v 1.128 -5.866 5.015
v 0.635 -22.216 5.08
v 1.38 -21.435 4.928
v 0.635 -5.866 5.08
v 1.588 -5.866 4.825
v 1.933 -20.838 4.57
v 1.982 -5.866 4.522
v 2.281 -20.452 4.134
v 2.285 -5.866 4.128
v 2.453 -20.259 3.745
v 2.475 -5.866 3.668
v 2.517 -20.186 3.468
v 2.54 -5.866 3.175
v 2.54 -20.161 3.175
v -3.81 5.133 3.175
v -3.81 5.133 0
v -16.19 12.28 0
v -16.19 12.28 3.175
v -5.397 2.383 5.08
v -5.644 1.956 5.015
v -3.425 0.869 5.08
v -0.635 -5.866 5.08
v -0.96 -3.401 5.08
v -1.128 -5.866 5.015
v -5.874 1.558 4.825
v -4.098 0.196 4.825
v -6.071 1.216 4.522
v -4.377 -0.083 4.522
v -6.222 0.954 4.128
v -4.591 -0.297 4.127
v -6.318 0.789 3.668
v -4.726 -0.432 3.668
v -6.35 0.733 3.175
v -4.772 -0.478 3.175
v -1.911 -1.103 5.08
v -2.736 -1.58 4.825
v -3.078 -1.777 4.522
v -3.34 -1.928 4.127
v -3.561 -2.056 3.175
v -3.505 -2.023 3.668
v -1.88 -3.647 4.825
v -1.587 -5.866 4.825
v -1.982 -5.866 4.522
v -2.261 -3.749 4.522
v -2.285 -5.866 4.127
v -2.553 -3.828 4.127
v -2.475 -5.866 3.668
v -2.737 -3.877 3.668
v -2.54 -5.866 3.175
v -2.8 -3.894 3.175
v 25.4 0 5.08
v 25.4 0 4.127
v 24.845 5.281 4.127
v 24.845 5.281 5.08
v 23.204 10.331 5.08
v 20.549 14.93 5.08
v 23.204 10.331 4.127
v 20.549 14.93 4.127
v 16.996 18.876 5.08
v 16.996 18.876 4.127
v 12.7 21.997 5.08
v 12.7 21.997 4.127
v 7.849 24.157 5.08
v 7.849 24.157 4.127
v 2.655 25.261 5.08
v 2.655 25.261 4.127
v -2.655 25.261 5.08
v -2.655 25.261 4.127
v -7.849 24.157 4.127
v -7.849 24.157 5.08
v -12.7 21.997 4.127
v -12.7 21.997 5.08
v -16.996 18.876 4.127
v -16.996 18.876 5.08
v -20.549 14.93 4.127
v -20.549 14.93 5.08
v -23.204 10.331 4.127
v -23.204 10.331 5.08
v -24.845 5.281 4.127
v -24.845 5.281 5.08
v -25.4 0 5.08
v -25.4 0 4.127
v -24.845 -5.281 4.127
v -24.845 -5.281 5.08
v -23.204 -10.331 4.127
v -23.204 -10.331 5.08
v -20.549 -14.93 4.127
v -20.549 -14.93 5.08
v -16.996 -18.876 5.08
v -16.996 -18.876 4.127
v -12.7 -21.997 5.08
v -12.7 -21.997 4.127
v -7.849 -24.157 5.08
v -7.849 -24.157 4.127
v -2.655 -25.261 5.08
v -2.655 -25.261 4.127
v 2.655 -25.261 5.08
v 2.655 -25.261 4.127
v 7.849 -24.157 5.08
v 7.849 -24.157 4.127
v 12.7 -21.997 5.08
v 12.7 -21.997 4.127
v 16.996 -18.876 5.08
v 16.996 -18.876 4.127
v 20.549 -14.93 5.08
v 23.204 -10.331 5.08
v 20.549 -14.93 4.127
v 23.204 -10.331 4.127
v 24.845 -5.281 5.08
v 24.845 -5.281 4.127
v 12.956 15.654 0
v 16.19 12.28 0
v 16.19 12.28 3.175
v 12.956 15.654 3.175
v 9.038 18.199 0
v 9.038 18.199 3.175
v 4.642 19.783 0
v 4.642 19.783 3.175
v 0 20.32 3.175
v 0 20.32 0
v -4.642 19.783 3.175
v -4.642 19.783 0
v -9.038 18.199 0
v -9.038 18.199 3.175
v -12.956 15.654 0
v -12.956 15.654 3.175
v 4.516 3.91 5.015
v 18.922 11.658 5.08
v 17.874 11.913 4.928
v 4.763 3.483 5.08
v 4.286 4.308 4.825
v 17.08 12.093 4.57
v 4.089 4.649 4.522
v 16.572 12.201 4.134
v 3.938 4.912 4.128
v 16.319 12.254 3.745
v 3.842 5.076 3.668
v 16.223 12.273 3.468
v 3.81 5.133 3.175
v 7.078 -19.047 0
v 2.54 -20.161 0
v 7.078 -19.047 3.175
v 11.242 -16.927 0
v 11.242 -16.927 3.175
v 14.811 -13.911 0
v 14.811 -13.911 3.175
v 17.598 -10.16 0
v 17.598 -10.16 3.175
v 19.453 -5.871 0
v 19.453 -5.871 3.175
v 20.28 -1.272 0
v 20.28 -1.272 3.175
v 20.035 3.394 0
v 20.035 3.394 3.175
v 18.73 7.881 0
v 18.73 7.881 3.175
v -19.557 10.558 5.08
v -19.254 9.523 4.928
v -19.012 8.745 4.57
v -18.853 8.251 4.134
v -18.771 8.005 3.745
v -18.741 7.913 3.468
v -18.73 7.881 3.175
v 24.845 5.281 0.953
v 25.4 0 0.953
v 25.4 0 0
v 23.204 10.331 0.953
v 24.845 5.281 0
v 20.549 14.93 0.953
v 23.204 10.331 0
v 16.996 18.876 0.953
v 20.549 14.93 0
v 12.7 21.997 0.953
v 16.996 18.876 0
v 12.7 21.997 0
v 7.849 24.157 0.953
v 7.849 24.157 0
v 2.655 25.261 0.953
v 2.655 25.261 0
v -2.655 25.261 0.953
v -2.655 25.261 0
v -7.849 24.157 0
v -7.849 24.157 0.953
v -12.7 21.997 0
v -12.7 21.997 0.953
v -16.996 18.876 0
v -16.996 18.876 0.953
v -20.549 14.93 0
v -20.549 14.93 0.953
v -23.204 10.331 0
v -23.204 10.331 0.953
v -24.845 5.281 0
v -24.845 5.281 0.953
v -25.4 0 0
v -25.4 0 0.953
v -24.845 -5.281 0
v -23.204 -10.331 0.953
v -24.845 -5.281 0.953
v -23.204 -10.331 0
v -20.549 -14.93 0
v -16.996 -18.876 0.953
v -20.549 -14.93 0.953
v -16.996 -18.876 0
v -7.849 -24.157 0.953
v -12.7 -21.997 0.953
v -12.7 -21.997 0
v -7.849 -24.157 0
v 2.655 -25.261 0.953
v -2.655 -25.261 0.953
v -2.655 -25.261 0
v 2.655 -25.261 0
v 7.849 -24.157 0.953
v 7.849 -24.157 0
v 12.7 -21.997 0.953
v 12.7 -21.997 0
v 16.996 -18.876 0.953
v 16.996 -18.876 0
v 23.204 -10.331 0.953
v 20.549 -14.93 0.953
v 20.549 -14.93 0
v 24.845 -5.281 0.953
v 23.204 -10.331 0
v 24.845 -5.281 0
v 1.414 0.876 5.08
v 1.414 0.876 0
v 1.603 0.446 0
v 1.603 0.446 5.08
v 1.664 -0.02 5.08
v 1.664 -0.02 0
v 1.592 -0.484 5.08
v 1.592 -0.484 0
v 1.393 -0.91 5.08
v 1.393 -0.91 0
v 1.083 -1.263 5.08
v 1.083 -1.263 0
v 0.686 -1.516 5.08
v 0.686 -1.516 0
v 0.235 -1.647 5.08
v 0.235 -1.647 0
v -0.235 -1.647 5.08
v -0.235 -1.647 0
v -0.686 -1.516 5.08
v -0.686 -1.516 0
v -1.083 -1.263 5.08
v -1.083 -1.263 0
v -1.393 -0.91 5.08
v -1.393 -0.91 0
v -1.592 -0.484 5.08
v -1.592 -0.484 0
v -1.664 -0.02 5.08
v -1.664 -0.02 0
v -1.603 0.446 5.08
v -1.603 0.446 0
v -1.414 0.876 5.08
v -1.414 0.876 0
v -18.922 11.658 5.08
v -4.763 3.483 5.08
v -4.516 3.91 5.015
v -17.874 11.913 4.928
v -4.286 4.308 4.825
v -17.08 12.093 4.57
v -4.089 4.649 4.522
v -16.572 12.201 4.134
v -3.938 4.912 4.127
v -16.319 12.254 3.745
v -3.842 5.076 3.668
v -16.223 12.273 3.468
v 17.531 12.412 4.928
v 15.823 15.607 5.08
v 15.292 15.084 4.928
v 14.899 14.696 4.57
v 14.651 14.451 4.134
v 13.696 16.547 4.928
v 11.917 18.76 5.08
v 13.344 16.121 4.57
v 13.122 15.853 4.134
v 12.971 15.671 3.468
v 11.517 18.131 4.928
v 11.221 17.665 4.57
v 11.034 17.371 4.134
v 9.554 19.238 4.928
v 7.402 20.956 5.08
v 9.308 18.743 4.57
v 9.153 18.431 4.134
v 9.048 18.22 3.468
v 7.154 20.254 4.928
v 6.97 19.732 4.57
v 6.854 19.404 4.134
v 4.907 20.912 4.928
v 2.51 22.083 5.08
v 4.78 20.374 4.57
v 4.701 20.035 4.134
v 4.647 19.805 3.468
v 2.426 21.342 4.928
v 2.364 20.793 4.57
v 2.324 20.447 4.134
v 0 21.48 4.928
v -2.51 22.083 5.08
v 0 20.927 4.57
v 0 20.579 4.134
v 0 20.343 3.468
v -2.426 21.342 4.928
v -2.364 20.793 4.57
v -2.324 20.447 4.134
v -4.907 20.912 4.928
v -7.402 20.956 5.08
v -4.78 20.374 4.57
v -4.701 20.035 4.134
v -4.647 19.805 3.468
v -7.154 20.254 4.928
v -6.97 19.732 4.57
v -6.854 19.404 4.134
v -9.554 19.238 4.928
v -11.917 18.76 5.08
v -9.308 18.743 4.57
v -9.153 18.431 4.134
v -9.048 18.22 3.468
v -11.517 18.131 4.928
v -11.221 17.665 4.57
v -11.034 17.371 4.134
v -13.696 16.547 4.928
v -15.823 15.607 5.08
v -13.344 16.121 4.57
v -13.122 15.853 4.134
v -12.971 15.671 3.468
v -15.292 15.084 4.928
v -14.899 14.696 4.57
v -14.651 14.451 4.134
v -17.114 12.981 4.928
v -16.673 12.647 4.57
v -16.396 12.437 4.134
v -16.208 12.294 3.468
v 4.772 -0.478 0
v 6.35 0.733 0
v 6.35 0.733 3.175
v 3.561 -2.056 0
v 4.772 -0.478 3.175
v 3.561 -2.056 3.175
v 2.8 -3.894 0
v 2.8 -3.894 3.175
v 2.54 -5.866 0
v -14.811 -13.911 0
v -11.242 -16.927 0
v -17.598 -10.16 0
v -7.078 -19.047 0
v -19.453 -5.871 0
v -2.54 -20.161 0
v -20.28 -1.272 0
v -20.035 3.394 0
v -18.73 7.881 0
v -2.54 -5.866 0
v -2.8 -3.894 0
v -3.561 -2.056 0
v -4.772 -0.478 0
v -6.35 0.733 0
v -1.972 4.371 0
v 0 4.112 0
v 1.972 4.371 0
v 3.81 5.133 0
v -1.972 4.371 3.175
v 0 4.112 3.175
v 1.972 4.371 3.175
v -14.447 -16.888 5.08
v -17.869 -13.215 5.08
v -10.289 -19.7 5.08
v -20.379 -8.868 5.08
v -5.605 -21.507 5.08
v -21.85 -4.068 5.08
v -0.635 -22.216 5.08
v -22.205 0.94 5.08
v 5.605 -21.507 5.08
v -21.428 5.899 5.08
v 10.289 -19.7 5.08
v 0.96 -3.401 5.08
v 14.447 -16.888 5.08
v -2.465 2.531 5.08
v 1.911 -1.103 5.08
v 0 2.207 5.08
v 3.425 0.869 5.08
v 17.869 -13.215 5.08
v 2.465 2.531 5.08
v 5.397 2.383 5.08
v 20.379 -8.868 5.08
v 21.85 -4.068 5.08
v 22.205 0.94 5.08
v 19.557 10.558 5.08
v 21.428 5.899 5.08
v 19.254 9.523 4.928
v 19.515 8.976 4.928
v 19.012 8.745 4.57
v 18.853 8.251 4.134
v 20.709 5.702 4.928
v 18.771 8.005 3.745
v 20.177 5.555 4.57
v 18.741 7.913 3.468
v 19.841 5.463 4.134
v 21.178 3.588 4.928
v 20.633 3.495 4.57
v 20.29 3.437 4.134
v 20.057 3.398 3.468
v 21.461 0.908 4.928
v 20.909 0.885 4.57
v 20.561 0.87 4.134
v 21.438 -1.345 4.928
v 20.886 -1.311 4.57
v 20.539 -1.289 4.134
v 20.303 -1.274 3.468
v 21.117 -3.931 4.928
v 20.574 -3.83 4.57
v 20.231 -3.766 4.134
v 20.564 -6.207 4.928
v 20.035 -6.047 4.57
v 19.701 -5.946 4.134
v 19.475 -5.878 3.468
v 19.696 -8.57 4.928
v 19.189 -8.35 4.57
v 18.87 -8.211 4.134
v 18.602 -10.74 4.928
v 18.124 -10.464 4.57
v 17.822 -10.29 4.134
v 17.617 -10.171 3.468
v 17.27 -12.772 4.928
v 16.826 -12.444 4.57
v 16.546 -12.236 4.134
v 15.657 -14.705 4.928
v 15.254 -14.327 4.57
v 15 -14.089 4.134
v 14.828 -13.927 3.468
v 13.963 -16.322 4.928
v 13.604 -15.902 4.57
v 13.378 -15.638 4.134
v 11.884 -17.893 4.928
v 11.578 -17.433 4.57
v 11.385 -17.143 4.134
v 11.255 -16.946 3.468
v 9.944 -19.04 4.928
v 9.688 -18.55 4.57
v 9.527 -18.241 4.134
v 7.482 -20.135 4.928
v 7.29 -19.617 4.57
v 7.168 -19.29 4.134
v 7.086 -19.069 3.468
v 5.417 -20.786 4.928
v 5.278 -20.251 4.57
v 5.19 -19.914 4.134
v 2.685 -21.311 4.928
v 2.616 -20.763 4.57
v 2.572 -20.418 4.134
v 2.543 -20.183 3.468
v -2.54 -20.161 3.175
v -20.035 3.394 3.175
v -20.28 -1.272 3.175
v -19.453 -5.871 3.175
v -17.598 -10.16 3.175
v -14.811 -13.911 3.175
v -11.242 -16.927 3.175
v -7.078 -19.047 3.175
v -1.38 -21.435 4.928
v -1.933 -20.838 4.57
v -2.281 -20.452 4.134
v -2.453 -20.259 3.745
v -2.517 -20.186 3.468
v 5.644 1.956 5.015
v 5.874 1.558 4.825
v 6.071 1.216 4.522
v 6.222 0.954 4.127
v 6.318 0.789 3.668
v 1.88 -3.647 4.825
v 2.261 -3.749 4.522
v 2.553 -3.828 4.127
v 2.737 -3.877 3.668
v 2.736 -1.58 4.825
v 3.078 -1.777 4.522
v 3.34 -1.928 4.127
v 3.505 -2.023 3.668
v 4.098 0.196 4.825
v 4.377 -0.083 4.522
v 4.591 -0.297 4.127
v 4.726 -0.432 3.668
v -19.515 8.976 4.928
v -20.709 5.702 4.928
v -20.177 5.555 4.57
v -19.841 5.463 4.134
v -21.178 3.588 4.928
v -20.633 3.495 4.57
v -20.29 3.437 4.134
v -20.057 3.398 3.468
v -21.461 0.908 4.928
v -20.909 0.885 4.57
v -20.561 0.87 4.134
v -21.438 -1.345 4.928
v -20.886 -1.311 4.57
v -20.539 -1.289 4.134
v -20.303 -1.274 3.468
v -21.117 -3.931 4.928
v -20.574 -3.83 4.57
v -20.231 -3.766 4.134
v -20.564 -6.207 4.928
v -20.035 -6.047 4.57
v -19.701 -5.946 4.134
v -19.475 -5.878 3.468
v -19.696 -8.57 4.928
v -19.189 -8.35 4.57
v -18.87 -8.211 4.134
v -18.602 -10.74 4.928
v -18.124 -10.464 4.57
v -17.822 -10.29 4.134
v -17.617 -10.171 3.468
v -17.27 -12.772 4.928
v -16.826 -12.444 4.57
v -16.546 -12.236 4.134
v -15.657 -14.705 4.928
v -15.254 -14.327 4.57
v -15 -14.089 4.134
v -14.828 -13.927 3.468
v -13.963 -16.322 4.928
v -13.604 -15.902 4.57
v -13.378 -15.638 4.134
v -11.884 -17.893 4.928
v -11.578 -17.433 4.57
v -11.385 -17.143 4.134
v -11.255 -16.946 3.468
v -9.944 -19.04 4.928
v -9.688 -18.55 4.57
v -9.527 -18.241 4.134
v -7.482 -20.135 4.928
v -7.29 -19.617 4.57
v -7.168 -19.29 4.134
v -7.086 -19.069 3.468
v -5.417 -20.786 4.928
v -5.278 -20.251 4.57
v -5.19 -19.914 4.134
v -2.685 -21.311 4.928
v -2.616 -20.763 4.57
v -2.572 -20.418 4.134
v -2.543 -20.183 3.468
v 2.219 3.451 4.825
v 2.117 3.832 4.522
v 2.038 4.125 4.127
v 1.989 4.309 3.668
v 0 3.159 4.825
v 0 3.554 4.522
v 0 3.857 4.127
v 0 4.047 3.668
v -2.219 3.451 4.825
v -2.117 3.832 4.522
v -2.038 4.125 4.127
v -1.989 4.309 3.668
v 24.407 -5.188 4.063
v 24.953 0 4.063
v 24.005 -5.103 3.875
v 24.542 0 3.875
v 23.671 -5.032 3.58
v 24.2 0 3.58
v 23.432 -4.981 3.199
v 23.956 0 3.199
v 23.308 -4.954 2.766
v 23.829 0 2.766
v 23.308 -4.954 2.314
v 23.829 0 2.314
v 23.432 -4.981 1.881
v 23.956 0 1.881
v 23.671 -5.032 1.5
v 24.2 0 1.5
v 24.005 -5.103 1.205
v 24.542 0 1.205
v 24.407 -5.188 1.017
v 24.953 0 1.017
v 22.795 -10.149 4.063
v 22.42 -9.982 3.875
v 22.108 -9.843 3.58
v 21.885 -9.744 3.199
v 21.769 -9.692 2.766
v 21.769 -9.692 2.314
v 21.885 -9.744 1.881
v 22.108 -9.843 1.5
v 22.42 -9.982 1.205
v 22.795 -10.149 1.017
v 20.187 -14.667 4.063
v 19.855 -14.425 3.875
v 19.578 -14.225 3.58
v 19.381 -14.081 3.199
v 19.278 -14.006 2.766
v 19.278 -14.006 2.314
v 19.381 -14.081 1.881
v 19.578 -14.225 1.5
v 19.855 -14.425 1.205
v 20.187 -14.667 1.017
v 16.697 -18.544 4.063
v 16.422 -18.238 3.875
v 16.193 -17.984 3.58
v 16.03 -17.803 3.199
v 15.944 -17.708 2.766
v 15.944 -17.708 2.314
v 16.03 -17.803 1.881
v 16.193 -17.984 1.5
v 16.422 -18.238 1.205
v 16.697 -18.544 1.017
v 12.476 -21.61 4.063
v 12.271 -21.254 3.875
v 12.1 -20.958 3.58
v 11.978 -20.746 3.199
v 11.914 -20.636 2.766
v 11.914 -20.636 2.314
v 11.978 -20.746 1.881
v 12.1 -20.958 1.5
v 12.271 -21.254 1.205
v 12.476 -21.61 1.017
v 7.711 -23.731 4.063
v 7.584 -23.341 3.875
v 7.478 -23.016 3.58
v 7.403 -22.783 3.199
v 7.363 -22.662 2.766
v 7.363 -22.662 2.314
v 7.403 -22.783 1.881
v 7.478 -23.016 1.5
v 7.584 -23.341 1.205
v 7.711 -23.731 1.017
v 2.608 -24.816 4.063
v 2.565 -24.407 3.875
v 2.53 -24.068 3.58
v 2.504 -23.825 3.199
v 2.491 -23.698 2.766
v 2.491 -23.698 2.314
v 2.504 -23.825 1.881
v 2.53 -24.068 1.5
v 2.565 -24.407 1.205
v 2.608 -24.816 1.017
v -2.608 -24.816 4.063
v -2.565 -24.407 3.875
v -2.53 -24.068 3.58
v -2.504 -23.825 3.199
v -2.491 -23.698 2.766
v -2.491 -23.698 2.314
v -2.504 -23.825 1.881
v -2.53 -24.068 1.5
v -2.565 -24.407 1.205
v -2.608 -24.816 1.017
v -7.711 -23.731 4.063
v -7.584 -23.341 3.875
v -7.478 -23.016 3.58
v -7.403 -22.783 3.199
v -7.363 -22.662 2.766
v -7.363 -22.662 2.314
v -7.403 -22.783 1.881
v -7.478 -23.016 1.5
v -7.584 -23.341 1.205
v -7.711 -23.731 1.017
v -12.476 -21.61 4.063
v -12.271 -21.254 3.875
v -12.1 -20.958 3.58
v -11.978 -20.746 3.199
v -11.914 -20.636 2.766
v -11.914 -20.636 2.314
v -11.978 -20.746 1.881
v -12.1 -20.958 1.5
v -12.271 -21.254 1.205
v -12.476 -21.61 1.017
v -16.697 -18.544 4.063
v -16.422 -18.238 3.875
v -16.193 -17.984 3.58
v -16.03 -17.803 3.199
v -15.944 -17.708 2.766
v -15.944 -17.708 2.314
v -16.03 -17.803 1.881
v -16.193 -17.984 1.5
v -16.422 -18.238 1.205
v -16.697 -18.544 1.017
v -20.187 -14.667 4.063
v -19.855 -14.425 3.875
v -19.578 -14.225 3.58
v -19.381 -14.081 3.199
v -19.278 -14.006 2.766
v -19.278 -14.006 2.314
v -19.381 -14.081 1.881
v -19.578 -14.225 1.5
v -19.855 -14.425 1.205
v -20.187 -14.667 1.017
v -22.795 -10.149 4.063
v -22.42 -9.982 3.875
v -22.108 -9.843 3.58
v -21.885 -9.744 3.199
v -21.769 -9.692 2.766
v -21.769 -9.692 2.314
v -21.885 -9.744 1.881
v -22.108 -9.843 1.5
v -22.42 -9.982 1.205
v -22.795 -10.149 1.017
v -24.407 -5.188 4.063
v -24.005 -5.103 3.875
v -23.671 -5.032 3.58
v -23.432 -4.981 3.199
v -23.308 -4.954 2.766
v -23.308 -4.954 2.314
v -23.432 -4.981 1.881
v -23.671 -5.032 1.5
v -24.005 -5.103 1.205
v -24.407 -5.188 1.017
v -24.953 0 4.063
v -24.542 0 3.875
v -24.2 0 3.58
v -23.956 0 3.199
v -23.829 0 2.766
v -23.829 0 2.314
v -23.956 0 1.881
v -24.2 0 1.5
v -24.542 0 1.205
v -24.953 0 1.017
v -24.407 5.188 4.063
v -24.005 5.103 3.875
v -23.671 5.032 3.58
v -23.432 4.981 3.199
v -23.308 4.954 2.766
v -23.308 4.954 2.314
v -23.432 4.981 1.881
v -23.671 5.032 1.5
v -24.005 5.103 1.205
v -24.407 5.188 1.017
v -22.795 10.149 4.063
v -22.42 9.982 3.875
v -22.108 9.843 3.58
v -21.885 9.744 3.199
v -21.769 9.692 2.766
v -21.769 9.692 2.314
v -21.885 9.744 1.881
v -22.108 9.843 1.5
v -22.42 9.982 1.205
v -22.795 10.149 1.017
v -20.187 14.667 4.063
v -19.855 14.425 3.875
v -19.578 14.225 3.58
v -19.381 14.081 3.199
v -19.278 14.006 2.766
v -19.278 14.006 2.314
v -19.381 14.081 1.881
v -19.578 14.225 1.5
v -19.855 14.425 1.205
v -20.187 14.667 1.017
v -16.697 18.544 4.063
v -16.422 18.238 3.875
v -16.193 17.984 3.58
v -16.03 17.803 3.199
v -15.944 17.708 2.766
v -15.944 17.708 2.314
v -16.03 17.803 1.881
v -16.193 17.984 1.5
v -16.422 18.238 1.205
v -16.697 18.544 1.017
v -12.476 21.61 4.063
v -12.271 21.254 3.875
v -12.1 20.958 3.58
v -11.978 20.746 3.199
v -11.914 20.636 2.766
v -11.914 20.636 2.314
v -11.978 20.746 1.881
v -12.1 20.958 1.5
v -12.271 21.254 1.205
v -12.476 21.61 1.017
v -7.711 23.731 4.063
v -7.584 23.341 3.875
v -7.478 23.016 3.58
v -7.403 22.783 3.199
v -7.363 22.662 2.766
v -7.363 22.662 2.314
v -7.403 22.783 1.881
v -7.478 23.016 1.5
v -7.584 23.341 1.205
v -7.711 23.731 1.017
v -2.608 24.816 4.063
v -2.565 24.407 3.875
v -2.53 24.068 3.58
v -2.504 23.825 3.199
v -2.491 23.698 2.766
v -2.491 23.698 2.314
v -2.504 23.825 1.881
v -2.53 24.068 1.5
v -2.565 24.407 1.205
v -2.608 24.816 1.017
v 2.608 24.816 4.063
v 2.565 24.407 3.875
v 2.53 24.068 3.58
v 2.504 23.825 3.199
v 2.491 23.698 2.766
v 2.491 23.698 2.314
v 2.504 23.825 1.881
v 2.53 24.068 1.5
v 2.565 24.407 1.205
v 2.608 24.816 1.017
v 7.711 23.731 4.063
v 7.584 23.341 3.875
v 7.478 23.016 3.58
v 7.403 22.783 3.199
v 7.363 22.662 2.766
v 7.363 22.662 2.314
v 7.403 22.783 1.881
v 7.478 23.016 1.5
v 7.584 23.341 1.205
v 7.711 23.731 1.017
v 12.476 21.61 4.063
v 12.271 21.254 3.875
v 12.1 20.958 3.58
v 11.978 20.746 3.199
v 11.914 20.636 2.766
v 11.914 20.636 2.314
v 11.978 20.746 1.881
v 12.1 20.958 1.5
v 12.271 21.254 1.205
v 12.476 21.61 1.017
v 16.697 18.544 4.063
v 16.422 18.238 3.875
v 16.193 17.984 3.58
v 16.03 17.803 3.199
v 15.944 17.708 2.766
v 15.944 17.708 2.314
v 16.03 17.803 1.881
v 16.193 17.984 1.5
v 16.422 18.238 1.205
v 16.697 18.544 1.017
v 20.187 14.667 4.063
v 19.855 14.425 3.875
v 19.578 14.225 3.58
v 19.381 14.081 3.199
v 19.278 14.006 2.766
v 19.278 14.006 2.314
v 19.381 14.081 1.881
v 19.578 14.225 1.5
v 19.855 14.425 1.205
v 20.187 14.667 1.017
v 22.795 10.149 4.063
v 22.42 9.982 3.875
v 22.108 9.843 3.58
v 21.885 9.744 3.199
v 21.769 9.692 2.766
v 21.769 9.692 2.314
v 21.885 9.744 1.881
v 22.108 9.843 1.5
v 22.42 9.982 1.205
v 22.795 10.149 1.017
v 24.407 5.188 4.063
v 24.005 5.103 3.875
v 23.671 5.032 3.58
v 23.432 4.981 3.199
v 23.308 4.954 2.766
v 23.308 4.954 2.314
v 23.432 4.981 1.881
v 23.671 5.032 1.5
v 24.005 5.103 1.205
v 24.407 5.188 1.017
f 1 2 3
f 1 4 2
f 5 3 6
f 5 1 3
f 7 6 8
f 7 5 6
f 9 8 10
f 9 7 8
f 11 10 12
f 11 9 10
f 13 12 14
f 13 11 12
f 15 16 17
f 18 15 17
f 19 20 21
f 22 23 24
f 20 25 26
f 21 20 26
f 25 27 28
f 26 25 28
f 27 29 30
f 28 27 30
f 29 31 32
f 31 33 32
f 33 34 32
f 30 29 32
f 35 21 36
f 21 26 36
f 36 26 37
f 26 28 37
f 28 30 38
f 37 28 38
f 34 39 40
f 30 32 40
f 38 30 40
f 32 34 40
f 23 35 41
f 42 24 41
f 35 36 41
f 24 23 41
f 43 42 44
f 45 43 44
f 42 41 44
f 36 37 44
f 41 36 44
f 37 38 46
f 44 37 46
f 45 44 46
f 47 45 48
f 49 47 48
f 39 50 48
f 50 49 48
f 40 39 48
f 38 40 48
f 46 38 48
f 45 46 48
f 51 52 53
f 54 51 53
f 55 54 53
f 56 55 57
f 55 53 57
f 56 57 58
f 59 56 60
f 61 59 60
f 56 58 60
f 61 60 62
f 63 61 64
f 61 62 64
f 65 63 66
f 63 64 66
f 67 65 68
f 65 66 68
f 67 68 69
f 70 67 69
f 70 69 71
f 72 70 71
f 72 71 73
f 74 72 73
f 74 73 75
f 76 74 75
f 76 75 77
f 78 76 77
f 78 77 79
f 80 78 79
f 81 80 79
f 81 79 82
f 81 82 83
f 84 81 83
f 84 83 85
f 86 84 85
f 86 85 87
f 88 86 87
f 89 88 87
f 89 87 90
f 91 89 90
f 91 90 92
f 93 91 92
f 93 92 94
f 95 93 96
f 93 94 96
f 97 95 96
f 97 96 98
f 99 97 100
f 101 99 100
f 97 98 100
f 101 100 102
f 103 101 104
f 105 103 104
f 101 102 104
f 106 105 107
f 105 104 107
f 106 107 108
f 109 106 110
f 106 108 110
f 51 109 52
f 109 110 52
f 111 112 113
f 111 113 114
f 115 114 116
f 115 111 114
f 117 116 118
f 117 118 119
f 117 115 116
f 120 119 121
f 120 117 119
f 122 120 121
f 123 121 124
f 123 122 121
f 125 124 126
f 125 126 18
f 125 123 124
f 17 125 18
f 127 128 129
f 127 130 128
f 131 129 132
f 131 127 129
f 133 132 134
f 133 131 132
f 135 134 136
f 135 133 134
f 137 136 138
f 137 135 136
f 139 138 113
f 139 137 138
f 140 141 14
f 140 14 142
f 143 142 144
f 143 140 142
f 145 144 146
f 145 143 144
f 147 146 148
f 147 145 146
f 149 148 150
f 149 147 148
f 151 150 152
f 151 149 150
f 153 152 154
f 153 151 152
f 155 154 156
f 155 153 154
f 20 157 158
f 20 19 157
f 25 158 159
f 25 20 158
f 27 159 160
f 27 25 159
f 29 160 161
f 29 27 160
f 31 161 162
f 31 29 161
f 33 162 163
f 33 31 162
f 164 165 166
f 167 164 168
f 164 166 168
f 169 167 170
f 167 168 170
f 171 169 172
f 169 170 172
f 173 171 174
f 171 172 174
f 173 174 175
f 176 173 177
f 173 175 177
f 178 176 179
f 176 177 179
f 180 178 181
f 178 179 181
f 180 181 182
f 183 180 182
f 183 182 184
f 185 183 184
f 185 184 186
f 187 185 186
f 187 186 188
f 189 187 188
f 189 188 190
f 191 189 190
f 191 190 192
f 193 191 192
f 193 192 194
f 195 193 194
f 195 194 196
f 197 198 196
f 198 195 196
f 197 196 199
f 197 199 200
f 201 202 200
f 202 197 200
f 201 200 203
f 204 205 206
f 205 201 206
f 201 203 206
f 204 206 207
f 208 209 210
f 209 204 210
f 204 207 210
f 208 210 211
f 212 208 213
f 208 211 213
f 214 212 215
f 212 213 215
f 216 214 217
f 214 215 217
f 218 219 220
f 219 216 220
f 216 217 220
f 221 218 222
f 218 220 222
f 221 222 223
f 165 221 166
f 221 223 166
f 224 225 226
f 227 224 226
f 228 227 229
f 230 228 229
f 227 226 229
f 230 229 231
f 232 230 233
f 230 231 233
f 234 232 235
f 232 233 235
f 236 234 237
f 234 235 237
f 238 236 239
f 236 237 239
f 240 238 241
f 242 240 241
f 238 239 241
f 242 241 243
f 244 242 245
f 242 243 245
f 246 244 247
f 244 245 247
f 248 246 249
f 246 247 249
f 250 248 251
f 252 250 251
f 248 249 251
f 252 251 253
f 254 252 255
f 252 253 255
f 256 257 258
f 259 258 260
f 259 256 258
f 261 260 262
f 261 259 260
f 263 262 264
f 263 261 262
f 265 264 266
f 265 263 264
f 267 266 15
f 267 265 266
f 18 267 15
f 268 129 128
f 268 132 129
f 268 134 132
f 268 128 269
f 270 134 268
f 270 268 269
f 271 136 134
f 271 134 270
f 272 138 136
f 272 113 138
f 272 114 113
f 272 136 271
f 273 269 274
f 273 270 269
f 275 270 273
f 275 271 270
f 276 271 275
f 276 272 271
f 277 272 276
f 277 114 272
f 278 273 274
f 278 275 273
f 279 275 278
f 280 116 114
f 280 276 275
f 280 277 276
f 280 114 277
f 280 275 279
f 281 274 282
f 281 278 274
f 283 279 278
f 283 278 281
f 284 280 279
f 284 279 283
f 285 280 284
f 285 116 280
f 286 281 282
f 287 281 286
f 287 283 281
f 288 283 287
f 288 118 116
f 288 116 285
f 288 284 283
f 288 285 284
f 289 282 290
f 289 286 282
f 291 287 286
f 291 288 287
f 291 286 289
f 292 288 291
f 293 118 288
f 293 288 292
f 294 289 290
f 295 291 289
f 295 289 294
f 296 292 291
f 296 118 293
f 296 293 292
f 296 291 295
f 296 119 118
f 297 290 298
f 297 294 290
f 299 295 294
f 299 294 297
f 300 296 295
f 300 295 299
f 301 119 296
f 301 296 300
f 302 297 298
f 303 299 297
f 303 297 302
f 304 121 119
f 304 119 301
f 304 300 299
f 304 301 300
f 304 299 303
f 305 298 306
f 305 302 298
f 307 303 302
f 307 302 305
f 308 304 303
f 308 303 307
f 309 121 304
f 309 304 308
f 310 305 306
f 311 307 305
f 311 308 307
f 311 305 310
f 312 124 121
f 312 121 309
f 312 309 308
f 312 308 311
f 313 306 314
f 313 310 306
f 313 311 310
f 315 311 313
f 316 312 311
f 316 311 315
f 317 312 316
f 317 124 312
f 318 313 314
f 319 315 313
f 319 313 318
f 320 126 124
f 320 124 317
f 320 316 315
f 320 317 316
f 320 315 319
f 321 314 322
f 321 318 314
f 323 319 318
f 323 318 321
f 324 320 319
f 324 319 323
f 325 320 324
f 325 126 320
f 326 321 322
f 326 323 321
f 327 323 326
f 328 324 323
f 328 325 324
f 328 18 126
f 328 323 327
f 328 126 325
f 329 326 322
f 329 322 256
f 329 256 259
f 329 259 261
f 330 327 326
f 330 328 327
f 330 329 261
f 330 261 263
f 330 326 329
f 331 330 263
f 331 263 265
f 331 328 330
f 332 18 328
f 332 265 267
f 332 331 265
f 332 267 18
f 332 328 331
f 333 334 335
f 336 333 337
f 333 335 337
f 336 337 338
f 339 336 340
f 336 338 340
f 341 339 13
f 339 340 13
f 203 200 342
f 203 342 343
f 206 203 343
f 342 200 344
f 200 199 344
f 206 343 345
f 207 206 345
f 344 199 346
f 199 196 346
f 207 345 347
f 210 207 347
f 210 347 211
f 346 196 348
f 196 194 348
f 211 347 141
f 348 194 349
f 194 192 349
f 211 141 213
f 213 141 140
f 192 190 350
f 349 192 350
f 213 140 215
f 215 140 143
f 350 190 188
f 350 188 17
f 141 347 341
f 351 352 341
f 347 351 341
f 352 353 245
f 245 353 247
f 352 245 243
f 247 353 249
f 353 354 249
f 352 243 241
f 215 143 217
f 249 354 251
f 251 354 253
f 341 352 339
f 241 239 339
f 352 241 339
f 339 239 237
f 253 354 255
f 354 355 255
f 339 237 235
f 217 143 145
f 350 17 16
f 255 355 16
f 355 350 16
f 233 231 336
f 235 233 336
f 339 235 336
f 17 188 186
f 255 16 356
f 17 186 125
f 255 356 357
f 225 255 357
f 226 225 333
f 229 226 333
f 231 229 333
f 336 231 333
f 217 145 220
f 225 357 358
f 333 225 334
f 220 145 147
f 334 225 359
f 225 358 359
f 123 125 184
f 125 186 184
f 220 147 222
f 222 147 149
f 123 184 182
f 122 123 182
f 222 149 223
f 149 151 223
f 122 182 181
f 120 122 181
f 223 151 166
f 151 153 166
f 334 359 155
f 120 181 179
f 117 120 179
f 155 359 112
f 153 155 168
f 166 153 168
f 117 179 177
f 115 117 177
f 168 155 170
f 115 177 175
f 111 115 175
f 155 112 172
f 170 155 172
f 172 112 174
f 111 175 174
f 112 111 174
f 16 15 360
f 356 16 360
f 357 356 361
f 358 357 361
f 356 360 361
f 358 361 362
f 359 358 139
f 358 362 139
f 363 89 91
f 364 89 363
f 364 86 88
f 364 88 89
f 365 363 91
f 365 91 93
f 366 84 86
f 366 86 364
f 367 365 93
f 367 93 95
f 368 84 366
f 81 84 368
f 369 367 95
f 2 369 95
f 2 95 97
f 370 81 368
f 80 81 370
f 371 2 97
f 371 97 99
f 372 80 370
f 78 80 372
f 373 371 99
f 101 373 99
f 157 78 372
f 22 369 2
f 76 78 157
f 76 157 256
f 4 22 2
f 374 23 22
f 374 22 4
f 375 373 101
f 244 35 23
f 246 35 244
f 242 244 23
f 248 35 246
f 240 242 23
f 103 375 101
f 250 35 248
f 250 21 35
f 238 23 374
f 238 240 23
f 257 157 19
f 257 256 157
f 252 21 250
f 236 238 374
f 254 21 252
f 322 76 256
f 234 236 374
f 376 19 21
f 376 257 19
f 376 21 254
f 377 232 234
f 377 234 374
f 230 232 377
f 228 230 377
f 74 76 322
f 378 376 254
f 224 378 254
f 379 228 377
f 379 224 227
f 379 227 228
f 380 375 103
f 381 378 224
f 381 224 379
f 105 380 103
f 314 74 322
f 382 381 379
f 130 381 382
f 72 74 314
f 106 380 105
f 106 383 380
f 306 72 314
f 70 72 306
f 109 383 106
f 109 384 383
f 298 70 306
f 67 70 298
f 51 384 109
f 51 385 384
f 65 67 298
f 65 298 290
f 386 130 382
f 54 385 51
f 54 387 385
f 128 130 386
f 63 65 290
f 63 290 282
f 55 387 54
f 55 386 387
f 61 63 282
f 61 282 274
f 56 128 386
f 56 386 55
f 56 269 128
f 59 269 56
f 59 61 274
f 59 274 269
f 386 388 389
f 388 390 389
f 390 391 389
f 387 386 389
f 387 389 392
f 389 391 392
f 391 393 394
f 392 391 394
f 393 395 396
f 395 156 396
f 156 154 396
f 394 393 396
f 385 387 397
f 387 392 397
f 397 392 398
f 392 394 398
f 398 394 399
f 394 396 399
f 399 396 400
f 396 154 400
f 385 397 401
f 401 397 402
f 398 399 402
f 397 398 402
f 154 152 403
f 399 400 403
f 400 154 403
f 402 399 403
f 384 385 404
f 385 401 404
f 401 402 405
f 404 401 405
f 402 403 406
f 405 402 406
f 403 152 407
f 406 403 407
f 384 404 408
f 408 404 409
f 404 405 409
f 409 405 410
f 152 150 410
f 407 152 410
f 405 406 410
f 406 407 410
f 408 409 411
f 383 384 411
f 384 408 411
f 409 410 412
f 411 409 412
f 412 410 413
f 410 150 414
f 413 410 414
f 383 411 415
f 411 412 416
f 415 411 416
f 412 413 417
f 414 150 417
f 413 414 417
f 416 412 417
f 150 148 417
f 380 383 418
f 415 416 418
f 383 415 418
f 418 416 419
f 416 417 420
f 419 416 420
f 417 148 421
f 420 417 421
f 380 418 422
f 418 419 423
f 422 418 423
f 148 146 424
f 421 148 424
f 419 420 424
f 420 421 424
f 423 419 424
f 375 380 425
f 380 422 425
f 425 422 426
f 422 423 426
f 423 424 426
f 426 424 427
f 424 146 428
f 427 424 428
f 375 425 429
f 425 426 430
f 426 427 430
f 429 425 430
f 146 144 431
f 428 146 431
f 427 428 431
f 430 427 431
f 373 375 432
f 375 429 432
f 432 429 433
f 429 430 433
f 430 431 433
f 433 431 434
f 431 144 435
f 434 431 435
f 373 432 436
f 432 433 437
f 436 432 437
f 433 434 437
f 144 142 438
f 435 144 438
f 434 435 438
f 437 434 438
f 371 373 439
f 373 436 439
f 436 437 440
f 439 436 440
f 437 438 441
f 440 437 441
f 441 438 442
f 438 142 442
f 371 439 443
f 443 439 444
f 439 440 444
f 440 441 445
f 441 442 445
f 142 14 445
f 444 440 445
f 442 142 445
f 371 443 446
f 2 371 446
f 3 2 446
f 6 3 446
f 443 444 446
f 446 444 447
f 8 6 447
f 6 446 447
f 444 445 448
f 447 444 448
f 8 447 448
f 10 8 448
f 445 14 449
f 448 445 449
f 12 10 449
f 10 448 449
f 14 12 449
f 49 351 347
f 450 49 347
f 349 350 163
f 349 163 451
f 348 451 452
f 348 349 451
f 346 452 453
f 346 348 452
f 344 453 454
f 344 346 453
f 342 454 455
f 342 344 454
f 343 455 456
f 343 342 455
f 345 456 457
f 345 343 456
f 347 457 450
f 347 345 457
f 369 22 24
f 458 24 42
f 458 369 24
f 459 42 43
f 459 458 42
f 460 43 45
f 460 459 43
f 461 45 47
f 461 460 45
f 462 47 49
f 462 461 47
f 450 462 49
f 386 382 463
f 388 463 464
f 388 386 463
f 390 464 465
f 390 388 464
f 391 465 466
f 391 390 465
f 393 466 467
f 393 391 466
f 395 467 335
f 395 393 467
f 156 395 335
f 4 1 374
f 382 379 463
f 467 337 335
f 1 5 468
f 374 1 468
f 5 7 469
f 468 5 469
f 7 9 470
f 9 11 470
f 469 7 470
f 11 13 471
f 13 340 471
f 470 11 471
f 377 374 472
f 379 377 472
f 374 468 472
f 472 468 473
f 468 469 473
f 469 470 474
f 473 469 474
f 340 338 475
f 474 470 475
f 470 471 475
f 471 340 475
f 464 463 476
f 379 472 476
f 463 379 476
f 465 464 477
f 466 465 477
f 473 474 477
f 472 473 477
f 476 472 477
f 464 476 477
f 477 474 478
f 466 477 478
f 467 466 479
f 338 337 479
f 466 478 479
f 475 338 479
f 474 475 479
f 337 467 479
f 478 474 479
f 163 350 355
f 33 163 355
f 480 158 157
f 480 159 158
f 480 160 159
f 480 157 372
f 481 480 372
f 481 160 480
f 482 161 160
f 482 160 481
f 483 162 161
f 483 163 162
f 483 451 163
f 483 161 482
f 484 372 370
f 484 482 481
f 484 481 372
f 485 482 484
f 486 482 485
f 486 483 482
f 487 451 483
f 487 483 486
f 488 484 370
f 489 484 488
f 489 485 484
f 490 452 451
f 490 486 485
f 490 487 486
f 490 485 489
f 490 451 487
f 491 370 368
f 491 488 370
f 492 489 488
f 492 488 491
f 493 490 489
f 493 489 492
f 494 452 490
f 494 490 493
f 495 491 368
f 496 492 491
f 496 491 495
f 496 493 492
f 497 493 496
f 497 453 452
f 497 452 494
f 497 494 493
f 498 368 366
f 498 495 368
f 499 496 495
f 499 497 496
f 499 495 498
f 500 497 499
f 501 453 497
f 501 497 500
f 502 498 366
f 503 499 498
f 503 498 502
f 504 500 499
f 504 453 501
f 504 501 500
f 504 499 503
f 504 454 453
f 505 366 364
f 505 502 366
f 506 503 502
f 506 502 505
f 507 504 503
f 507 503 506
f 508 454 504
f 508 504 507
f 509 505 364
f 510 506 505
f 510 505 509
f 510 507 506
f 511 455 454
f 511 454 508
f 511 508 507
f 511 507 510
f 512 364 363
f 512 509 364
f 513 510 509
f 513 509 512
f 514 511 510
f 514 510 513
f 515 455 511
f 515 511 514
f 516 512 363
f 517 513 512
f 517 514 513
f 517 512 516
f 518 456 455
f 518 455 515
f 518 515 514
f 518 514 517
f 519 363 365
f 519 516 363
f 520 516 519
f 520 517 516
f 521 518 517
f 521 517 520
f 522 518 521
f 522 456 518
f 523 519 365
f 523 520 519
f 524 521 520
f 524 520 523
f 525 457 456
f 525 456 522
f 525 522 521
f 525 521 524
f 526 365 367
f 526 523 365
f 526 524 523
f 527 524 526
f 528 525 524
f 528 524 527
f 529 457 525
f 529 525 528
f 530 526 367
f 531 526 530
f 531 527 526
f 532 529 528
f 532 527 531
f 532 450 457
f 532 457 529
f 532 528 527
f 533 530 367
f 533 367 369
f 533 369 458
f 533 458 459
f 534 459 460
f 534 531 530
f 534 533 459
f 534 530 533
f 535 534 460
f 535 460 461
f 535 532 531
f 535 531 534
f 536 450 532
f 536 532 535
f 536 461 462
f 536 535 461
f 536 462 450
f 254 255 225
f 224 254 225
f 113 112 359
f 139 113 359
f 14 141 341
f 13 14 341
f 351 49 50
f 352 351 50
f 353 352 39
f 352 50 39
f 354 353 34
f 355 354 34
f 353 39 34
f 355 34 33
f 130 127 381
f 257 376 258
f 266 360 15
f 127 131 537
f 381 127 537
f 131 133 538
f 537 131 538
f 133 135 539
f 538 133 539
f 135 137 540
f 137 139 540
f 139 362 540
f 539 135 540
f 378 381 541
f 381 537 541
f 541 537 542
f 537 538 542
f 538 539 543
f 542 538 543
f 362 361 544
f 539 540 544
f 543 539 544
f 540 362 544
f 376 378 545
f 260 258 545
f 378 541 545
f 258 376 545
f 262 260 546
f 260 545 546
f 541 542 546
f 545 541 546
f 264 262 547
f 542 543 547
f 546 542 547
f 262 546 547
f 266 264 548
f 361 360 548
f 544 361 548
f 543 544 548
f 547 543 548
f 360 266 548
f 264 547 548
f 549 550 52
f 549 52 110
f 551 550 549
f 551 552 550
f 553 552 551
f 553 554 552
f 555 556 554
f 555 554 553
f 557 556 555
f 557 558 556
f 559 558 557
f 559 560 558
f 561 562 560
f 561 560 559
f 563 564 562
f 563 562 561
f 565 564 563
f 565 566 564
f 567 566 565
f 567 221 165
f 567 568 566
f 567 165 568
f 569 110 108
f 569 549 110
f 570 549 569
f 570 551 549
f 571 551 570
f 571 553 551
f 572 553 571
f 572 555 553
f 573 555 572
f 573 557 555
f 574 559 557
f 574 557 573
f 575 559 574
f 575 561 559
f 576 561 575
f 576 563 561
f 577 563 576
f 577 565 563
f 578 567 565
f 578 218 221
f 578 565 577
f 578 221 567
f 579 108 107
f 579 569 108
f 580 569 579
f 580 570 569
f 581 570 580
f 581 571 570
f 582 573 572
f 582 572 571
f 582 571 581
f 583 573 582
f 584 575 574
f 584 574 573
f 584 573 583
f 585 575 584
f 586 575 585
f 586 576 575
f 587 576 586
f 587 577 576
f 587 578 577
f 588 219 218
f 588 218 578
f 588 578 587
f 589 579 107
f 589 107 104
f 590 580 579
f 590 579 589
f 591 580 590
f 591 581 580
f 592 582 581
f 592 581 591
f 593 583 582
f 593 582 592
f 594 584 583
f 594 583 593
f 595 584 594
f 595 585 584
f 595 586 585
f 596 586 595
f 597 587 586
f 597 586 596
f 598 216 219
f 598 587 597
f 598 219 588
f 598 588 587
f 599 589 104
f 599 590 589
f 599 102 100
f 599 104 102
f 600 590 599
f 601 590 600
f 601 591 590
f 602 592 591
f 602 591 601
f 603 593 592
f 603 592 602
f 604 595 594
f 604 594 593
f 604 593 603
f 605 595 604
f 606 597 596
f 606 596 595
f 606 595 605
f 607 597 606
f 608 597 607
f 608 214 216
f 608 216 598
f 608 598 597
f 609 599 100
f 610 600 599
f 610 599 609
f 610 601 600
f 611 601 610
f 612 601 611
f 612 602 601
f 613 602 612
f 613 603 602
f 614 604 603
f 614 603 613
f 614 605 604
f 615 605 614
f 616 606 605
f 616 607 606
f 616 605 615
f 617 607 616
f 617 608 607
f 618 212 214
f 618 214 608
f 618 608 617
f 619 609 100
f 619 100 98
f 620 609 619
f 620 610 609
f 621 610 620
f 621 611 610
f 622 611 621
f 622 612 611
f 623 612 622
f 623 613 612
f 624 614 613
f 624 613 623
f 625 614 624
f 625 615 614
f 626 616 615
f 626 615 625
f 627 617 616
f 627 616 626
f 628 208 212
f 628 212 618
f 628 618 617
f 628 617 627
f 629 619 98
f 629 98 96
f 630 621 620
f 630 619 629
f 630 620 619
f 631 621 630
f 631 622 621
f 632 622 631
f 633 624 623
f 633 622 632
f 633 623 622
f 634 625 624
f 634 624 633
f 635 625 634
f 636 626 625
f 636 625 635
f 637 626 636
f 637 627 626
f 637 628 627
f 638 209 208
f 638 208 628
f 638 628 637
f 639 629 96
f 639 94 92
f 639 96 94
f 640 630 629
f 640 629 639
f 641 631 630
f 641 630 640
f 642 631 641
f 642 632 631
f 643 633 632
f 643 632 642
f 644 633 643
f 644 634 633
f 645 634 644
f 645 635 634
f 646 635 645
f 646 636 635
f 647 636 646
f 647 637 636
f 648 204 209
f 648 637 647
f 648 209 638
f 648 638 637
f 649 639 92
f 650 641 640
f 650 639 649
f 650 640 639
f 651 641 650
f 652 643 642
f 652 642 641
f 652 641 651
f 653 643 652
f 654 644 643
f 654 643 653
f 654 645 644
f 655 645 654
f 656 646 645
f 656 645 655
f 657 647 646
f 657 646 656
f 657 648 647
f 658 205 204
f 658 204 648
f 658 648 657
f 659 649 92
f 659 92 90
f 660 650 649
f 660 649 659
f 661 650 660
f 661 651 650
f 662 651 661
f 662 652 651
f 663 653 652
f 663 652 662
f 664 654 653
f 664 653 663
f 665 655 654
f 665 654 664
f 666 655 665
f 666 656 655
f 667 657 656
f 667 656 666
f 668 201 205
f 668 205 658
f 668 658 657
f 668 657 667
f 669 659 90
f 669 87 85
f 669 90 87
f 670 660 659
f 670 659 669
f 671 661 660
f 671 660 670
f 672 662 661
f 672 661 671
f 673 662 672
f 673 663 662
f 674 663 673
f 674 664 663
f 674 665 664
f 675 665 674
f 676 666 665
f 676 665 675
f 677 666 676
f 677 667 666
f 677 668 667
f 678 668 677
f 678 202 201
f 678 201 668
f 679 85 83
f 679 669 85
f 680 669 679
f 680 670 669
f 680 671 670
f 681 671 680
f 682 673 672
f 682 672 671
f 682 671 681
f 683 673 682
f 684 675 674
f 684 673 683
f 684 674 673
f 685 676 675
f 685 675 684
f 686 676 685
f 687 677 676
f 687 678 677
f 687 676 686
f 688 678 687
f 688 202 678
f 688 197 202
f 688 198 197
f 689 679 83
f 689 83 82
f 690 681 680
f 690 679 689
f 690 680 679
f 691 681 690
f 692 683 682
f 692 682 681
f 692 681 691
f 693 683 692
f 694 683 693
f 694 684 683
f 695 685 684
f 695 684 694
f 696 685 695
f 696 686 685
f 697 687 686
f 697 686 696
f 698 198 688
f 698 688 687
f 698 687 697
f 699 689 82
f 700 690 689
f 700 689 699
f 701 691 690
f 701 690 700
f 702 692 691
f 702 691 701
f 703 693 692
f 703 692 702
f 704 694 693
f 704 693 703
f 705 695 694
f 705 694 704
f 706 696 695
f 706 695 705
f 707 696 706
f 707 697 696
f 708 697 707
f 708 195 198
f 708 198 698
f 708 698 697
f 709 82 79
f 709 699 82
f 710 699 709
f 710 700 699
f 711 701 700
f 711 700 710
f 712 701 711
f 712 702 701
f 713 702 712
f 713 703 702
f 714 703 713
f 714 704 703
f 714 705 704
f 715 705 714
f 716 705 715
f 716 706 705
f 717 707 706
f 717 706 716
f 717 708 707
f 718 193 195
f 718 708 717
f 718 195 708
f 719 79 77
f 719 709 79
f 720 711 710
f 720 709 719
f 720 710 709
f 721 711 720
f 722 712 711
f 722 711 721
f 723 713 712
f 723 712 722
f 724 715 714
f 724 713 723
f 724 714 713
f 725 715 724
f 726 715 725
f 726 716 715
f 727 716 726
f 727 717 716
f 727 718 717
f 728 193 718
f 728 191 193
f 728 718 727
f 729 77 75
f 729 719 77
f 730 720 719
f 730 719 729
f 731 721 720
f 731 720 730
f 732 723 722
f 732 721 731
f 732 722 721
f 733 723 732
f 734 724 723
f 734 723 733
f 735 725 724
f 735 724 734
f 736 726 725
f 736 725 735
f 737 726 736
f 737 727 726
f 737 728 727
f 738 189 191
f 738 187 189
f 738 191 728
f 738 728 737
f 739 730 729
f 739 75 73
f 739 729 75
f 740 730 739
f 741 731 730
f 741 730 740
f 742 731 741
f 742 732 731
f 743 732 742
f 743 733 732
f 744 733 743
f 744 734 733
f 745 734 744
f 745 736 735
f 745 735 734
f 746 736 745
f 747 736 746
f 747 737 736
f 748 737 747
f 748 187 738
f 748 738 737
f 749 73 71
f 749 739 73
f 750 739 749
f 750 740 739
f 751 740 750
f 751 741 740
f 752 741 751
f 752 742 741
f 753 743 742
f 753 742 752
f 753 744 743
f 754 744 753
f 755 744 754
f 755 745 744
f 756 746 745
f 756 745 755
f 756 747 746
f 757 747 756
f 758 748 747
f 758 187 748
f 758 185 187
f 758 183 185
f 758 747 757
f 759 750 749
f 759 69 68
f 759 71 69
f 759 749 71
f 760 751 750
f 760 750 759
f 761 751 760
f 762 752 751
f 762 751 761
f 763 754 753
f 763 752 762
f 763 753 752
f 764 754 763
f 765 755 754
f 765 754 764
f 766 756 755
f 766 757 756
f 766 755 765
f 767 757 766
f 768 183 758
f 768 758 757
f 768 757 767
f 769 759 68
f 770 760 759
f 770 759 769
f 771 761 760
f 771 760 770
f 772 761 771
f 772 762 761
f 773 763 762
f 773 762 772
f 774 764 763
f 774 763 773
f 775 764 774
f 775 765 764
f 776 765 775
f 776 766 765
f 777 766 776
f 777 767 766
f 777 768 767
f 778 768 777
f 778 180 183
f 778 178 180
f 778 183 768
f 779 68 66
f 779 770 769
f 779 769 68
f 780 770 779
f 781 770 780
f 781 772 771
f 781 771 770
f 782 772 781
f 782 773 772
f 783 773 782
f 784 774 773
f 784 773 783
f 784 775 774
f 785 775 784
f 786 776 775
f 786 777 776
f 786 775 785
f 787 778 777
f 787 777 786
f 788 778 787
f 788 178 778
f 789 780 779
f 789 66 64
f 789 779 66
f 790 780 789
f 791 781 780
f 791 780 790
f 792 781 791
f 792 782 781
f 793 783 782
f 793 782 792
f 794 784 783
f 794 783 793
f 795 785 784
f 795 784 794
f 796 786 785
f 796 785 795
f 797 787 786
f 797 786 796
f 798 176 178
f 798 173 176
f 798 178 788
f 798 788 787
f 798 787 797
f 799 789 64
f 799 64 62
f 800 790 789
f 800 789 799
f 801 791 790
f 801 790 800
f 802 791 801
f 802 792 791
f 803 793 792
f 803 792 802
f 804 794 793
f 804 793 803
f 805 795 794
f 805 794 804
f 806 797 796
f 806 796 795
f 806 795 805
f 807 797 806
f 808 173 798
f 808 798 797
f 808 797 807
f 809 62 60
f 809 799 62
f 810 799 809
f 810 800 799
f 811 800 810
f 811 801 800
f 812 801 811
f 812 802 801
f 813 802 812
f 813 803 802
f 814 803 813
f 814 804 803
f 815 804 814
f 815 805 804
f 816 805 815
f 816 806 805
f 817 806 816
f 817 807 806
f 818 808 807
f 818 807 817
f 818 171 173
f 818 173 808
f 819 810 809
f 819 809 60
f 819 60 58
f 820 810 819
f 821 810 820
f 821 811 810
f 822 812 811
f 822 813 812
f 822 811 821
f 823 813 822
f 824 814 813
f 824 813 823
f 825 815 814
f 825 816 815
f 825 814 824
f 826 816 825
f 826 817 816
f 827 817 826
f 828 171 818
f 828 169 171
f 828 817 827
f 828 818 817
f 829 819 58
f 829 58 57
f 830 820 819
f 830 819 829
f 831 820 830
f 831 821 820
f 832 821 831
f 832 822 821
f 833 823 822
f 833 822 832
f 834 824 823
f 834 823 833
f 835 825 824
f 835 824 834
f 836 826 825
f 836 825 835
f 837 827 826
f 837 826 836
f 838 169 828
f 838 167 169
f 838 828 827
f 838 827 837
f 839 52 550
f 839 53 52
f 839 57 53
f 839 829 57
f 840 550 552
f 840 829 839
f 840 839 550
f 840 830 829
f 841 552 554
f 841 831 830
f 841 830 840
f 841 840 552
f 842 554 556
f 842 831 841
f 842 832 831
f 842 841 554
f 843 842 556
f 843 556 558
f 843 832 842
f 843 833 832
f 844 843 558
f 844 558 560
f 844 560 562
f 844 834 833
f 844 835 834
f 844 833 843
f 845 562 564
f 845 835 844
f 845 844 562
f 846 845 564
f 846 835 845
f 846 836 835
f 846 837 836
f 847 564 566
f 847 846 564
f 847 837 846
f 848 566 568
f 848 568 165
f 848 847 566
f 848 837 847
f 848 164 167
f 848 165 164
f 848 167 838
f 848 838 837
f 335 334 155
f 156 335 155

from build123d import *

# Parameters (mm, degrees)
SKETCH1_R           = 25.4
BOSS_EXTRUDE1_DEPTH = 5.08
FILLET4_R           = 7.62
FILLET5_R           = 1.905
SKETCH2_R           = 1.5875


with BuildPart() as part:
    # Sketch1 → Boss-Extrude1 (new body)
    with BuildSketch(Plane.XY):
        Circle(SKETCH1_R)
        with BuildLine():
            Line((2.54, -20.16062499), (2.54, -1.466469684))
            Line((2.54, -1.466469684), (18.729613398, 7.88060797))
            ThreePointArc((18.729613398, 7.88060797), (17.597636205, -10.16), (2.54, -20.16062499))
        make_face(mode=Mode.SUBTRACT)
        with BuildLine():
            Line((-2.54, -1.466469684), (-2.54, -20.16062499))
            ThreePointArc((-2.54, -20.16062499), (-17.597636205, -10.16), (-18.729613398, 7.88060797))
            Line((-18.729613398, 7.88060797), (-2.54, -1.466469684))
        make_face(mode=Mode.SUBTRACT)
        with BuildLine():
            Line((0, 2.932939367), (-16.189613398, 12.280017021))
            ThreePointArc((-16.189613398, 12.280017021), (0, 20.32), (16.189613398, 12.280017021))
            Line((16.189613398, 12.280017021), (0, 2.932939367))
        make_face(mode=Mode.SUBTRACT)
        with BuildLine():
            ThreePointArc((1.414212148, 0.8763), (0, -1.6637), (-1.414212148, 0.8763))
            Line((-1.414212148, 0.8763), (1.414212148, 0.8763))
        make_face(mode=Mode.SUBTRACT)
    extrude(amount=BOSS_EXTRUDE1_DEPTH)

    # Fillet4
    fillet4_edges = [part.edges().sort_by_distance(p)[0] for p in [
        (0, 2.932939367, 2.54),
        (2.54, -1.466469684, 2.54),
        (-2.54, -1.466469684, 2.54),
    ]]
    fillet(fillet4_edges, radius=FILLET4_R)

    # Fillet5
    fillet5_edges = [part.edges().sort_by_distance(p)[0] for p in [
        (9.999806699, 8.706330457, 5.08),
        (-9.999806699, 8.706330457, 5.08),
        (12.539806699, 4.306921406, 5.08),
        (3.560886423, -2.055878735, 5.08),
        (-2.54, -13.013251863, 5.08),
        (-3.560886423, -2.055878735, 5.08),
        (0, 20.32, 5.08),
        (-17.597636205, -10.16, 5.08),
        (17.597636205, -10.16, 5.08),
        (0, 4.11175747, 5.08),
        (2.54, -13.013251863, 5.08),
        (-12.539806699, 4.306921406, 5.08),
    ]]
    fillet(fillet5_edges, radius=FILLET5_R)

    # Sketch2 → Cut-Revolve1 (revolve, cut)
    with BuildSketch(Plane(origin=(0, 0, 0), x_dir=(0, 0, -1), z_dir=(1, 0, 0))):
        with Locations((-2.54, 25.4)):
            Circle(SKETCH2_R)
    revolve(axis=Axis((0, 0, 5.08), (0, 0, -1)), mode=Mode.SUBTRACT)


solid = part.part
